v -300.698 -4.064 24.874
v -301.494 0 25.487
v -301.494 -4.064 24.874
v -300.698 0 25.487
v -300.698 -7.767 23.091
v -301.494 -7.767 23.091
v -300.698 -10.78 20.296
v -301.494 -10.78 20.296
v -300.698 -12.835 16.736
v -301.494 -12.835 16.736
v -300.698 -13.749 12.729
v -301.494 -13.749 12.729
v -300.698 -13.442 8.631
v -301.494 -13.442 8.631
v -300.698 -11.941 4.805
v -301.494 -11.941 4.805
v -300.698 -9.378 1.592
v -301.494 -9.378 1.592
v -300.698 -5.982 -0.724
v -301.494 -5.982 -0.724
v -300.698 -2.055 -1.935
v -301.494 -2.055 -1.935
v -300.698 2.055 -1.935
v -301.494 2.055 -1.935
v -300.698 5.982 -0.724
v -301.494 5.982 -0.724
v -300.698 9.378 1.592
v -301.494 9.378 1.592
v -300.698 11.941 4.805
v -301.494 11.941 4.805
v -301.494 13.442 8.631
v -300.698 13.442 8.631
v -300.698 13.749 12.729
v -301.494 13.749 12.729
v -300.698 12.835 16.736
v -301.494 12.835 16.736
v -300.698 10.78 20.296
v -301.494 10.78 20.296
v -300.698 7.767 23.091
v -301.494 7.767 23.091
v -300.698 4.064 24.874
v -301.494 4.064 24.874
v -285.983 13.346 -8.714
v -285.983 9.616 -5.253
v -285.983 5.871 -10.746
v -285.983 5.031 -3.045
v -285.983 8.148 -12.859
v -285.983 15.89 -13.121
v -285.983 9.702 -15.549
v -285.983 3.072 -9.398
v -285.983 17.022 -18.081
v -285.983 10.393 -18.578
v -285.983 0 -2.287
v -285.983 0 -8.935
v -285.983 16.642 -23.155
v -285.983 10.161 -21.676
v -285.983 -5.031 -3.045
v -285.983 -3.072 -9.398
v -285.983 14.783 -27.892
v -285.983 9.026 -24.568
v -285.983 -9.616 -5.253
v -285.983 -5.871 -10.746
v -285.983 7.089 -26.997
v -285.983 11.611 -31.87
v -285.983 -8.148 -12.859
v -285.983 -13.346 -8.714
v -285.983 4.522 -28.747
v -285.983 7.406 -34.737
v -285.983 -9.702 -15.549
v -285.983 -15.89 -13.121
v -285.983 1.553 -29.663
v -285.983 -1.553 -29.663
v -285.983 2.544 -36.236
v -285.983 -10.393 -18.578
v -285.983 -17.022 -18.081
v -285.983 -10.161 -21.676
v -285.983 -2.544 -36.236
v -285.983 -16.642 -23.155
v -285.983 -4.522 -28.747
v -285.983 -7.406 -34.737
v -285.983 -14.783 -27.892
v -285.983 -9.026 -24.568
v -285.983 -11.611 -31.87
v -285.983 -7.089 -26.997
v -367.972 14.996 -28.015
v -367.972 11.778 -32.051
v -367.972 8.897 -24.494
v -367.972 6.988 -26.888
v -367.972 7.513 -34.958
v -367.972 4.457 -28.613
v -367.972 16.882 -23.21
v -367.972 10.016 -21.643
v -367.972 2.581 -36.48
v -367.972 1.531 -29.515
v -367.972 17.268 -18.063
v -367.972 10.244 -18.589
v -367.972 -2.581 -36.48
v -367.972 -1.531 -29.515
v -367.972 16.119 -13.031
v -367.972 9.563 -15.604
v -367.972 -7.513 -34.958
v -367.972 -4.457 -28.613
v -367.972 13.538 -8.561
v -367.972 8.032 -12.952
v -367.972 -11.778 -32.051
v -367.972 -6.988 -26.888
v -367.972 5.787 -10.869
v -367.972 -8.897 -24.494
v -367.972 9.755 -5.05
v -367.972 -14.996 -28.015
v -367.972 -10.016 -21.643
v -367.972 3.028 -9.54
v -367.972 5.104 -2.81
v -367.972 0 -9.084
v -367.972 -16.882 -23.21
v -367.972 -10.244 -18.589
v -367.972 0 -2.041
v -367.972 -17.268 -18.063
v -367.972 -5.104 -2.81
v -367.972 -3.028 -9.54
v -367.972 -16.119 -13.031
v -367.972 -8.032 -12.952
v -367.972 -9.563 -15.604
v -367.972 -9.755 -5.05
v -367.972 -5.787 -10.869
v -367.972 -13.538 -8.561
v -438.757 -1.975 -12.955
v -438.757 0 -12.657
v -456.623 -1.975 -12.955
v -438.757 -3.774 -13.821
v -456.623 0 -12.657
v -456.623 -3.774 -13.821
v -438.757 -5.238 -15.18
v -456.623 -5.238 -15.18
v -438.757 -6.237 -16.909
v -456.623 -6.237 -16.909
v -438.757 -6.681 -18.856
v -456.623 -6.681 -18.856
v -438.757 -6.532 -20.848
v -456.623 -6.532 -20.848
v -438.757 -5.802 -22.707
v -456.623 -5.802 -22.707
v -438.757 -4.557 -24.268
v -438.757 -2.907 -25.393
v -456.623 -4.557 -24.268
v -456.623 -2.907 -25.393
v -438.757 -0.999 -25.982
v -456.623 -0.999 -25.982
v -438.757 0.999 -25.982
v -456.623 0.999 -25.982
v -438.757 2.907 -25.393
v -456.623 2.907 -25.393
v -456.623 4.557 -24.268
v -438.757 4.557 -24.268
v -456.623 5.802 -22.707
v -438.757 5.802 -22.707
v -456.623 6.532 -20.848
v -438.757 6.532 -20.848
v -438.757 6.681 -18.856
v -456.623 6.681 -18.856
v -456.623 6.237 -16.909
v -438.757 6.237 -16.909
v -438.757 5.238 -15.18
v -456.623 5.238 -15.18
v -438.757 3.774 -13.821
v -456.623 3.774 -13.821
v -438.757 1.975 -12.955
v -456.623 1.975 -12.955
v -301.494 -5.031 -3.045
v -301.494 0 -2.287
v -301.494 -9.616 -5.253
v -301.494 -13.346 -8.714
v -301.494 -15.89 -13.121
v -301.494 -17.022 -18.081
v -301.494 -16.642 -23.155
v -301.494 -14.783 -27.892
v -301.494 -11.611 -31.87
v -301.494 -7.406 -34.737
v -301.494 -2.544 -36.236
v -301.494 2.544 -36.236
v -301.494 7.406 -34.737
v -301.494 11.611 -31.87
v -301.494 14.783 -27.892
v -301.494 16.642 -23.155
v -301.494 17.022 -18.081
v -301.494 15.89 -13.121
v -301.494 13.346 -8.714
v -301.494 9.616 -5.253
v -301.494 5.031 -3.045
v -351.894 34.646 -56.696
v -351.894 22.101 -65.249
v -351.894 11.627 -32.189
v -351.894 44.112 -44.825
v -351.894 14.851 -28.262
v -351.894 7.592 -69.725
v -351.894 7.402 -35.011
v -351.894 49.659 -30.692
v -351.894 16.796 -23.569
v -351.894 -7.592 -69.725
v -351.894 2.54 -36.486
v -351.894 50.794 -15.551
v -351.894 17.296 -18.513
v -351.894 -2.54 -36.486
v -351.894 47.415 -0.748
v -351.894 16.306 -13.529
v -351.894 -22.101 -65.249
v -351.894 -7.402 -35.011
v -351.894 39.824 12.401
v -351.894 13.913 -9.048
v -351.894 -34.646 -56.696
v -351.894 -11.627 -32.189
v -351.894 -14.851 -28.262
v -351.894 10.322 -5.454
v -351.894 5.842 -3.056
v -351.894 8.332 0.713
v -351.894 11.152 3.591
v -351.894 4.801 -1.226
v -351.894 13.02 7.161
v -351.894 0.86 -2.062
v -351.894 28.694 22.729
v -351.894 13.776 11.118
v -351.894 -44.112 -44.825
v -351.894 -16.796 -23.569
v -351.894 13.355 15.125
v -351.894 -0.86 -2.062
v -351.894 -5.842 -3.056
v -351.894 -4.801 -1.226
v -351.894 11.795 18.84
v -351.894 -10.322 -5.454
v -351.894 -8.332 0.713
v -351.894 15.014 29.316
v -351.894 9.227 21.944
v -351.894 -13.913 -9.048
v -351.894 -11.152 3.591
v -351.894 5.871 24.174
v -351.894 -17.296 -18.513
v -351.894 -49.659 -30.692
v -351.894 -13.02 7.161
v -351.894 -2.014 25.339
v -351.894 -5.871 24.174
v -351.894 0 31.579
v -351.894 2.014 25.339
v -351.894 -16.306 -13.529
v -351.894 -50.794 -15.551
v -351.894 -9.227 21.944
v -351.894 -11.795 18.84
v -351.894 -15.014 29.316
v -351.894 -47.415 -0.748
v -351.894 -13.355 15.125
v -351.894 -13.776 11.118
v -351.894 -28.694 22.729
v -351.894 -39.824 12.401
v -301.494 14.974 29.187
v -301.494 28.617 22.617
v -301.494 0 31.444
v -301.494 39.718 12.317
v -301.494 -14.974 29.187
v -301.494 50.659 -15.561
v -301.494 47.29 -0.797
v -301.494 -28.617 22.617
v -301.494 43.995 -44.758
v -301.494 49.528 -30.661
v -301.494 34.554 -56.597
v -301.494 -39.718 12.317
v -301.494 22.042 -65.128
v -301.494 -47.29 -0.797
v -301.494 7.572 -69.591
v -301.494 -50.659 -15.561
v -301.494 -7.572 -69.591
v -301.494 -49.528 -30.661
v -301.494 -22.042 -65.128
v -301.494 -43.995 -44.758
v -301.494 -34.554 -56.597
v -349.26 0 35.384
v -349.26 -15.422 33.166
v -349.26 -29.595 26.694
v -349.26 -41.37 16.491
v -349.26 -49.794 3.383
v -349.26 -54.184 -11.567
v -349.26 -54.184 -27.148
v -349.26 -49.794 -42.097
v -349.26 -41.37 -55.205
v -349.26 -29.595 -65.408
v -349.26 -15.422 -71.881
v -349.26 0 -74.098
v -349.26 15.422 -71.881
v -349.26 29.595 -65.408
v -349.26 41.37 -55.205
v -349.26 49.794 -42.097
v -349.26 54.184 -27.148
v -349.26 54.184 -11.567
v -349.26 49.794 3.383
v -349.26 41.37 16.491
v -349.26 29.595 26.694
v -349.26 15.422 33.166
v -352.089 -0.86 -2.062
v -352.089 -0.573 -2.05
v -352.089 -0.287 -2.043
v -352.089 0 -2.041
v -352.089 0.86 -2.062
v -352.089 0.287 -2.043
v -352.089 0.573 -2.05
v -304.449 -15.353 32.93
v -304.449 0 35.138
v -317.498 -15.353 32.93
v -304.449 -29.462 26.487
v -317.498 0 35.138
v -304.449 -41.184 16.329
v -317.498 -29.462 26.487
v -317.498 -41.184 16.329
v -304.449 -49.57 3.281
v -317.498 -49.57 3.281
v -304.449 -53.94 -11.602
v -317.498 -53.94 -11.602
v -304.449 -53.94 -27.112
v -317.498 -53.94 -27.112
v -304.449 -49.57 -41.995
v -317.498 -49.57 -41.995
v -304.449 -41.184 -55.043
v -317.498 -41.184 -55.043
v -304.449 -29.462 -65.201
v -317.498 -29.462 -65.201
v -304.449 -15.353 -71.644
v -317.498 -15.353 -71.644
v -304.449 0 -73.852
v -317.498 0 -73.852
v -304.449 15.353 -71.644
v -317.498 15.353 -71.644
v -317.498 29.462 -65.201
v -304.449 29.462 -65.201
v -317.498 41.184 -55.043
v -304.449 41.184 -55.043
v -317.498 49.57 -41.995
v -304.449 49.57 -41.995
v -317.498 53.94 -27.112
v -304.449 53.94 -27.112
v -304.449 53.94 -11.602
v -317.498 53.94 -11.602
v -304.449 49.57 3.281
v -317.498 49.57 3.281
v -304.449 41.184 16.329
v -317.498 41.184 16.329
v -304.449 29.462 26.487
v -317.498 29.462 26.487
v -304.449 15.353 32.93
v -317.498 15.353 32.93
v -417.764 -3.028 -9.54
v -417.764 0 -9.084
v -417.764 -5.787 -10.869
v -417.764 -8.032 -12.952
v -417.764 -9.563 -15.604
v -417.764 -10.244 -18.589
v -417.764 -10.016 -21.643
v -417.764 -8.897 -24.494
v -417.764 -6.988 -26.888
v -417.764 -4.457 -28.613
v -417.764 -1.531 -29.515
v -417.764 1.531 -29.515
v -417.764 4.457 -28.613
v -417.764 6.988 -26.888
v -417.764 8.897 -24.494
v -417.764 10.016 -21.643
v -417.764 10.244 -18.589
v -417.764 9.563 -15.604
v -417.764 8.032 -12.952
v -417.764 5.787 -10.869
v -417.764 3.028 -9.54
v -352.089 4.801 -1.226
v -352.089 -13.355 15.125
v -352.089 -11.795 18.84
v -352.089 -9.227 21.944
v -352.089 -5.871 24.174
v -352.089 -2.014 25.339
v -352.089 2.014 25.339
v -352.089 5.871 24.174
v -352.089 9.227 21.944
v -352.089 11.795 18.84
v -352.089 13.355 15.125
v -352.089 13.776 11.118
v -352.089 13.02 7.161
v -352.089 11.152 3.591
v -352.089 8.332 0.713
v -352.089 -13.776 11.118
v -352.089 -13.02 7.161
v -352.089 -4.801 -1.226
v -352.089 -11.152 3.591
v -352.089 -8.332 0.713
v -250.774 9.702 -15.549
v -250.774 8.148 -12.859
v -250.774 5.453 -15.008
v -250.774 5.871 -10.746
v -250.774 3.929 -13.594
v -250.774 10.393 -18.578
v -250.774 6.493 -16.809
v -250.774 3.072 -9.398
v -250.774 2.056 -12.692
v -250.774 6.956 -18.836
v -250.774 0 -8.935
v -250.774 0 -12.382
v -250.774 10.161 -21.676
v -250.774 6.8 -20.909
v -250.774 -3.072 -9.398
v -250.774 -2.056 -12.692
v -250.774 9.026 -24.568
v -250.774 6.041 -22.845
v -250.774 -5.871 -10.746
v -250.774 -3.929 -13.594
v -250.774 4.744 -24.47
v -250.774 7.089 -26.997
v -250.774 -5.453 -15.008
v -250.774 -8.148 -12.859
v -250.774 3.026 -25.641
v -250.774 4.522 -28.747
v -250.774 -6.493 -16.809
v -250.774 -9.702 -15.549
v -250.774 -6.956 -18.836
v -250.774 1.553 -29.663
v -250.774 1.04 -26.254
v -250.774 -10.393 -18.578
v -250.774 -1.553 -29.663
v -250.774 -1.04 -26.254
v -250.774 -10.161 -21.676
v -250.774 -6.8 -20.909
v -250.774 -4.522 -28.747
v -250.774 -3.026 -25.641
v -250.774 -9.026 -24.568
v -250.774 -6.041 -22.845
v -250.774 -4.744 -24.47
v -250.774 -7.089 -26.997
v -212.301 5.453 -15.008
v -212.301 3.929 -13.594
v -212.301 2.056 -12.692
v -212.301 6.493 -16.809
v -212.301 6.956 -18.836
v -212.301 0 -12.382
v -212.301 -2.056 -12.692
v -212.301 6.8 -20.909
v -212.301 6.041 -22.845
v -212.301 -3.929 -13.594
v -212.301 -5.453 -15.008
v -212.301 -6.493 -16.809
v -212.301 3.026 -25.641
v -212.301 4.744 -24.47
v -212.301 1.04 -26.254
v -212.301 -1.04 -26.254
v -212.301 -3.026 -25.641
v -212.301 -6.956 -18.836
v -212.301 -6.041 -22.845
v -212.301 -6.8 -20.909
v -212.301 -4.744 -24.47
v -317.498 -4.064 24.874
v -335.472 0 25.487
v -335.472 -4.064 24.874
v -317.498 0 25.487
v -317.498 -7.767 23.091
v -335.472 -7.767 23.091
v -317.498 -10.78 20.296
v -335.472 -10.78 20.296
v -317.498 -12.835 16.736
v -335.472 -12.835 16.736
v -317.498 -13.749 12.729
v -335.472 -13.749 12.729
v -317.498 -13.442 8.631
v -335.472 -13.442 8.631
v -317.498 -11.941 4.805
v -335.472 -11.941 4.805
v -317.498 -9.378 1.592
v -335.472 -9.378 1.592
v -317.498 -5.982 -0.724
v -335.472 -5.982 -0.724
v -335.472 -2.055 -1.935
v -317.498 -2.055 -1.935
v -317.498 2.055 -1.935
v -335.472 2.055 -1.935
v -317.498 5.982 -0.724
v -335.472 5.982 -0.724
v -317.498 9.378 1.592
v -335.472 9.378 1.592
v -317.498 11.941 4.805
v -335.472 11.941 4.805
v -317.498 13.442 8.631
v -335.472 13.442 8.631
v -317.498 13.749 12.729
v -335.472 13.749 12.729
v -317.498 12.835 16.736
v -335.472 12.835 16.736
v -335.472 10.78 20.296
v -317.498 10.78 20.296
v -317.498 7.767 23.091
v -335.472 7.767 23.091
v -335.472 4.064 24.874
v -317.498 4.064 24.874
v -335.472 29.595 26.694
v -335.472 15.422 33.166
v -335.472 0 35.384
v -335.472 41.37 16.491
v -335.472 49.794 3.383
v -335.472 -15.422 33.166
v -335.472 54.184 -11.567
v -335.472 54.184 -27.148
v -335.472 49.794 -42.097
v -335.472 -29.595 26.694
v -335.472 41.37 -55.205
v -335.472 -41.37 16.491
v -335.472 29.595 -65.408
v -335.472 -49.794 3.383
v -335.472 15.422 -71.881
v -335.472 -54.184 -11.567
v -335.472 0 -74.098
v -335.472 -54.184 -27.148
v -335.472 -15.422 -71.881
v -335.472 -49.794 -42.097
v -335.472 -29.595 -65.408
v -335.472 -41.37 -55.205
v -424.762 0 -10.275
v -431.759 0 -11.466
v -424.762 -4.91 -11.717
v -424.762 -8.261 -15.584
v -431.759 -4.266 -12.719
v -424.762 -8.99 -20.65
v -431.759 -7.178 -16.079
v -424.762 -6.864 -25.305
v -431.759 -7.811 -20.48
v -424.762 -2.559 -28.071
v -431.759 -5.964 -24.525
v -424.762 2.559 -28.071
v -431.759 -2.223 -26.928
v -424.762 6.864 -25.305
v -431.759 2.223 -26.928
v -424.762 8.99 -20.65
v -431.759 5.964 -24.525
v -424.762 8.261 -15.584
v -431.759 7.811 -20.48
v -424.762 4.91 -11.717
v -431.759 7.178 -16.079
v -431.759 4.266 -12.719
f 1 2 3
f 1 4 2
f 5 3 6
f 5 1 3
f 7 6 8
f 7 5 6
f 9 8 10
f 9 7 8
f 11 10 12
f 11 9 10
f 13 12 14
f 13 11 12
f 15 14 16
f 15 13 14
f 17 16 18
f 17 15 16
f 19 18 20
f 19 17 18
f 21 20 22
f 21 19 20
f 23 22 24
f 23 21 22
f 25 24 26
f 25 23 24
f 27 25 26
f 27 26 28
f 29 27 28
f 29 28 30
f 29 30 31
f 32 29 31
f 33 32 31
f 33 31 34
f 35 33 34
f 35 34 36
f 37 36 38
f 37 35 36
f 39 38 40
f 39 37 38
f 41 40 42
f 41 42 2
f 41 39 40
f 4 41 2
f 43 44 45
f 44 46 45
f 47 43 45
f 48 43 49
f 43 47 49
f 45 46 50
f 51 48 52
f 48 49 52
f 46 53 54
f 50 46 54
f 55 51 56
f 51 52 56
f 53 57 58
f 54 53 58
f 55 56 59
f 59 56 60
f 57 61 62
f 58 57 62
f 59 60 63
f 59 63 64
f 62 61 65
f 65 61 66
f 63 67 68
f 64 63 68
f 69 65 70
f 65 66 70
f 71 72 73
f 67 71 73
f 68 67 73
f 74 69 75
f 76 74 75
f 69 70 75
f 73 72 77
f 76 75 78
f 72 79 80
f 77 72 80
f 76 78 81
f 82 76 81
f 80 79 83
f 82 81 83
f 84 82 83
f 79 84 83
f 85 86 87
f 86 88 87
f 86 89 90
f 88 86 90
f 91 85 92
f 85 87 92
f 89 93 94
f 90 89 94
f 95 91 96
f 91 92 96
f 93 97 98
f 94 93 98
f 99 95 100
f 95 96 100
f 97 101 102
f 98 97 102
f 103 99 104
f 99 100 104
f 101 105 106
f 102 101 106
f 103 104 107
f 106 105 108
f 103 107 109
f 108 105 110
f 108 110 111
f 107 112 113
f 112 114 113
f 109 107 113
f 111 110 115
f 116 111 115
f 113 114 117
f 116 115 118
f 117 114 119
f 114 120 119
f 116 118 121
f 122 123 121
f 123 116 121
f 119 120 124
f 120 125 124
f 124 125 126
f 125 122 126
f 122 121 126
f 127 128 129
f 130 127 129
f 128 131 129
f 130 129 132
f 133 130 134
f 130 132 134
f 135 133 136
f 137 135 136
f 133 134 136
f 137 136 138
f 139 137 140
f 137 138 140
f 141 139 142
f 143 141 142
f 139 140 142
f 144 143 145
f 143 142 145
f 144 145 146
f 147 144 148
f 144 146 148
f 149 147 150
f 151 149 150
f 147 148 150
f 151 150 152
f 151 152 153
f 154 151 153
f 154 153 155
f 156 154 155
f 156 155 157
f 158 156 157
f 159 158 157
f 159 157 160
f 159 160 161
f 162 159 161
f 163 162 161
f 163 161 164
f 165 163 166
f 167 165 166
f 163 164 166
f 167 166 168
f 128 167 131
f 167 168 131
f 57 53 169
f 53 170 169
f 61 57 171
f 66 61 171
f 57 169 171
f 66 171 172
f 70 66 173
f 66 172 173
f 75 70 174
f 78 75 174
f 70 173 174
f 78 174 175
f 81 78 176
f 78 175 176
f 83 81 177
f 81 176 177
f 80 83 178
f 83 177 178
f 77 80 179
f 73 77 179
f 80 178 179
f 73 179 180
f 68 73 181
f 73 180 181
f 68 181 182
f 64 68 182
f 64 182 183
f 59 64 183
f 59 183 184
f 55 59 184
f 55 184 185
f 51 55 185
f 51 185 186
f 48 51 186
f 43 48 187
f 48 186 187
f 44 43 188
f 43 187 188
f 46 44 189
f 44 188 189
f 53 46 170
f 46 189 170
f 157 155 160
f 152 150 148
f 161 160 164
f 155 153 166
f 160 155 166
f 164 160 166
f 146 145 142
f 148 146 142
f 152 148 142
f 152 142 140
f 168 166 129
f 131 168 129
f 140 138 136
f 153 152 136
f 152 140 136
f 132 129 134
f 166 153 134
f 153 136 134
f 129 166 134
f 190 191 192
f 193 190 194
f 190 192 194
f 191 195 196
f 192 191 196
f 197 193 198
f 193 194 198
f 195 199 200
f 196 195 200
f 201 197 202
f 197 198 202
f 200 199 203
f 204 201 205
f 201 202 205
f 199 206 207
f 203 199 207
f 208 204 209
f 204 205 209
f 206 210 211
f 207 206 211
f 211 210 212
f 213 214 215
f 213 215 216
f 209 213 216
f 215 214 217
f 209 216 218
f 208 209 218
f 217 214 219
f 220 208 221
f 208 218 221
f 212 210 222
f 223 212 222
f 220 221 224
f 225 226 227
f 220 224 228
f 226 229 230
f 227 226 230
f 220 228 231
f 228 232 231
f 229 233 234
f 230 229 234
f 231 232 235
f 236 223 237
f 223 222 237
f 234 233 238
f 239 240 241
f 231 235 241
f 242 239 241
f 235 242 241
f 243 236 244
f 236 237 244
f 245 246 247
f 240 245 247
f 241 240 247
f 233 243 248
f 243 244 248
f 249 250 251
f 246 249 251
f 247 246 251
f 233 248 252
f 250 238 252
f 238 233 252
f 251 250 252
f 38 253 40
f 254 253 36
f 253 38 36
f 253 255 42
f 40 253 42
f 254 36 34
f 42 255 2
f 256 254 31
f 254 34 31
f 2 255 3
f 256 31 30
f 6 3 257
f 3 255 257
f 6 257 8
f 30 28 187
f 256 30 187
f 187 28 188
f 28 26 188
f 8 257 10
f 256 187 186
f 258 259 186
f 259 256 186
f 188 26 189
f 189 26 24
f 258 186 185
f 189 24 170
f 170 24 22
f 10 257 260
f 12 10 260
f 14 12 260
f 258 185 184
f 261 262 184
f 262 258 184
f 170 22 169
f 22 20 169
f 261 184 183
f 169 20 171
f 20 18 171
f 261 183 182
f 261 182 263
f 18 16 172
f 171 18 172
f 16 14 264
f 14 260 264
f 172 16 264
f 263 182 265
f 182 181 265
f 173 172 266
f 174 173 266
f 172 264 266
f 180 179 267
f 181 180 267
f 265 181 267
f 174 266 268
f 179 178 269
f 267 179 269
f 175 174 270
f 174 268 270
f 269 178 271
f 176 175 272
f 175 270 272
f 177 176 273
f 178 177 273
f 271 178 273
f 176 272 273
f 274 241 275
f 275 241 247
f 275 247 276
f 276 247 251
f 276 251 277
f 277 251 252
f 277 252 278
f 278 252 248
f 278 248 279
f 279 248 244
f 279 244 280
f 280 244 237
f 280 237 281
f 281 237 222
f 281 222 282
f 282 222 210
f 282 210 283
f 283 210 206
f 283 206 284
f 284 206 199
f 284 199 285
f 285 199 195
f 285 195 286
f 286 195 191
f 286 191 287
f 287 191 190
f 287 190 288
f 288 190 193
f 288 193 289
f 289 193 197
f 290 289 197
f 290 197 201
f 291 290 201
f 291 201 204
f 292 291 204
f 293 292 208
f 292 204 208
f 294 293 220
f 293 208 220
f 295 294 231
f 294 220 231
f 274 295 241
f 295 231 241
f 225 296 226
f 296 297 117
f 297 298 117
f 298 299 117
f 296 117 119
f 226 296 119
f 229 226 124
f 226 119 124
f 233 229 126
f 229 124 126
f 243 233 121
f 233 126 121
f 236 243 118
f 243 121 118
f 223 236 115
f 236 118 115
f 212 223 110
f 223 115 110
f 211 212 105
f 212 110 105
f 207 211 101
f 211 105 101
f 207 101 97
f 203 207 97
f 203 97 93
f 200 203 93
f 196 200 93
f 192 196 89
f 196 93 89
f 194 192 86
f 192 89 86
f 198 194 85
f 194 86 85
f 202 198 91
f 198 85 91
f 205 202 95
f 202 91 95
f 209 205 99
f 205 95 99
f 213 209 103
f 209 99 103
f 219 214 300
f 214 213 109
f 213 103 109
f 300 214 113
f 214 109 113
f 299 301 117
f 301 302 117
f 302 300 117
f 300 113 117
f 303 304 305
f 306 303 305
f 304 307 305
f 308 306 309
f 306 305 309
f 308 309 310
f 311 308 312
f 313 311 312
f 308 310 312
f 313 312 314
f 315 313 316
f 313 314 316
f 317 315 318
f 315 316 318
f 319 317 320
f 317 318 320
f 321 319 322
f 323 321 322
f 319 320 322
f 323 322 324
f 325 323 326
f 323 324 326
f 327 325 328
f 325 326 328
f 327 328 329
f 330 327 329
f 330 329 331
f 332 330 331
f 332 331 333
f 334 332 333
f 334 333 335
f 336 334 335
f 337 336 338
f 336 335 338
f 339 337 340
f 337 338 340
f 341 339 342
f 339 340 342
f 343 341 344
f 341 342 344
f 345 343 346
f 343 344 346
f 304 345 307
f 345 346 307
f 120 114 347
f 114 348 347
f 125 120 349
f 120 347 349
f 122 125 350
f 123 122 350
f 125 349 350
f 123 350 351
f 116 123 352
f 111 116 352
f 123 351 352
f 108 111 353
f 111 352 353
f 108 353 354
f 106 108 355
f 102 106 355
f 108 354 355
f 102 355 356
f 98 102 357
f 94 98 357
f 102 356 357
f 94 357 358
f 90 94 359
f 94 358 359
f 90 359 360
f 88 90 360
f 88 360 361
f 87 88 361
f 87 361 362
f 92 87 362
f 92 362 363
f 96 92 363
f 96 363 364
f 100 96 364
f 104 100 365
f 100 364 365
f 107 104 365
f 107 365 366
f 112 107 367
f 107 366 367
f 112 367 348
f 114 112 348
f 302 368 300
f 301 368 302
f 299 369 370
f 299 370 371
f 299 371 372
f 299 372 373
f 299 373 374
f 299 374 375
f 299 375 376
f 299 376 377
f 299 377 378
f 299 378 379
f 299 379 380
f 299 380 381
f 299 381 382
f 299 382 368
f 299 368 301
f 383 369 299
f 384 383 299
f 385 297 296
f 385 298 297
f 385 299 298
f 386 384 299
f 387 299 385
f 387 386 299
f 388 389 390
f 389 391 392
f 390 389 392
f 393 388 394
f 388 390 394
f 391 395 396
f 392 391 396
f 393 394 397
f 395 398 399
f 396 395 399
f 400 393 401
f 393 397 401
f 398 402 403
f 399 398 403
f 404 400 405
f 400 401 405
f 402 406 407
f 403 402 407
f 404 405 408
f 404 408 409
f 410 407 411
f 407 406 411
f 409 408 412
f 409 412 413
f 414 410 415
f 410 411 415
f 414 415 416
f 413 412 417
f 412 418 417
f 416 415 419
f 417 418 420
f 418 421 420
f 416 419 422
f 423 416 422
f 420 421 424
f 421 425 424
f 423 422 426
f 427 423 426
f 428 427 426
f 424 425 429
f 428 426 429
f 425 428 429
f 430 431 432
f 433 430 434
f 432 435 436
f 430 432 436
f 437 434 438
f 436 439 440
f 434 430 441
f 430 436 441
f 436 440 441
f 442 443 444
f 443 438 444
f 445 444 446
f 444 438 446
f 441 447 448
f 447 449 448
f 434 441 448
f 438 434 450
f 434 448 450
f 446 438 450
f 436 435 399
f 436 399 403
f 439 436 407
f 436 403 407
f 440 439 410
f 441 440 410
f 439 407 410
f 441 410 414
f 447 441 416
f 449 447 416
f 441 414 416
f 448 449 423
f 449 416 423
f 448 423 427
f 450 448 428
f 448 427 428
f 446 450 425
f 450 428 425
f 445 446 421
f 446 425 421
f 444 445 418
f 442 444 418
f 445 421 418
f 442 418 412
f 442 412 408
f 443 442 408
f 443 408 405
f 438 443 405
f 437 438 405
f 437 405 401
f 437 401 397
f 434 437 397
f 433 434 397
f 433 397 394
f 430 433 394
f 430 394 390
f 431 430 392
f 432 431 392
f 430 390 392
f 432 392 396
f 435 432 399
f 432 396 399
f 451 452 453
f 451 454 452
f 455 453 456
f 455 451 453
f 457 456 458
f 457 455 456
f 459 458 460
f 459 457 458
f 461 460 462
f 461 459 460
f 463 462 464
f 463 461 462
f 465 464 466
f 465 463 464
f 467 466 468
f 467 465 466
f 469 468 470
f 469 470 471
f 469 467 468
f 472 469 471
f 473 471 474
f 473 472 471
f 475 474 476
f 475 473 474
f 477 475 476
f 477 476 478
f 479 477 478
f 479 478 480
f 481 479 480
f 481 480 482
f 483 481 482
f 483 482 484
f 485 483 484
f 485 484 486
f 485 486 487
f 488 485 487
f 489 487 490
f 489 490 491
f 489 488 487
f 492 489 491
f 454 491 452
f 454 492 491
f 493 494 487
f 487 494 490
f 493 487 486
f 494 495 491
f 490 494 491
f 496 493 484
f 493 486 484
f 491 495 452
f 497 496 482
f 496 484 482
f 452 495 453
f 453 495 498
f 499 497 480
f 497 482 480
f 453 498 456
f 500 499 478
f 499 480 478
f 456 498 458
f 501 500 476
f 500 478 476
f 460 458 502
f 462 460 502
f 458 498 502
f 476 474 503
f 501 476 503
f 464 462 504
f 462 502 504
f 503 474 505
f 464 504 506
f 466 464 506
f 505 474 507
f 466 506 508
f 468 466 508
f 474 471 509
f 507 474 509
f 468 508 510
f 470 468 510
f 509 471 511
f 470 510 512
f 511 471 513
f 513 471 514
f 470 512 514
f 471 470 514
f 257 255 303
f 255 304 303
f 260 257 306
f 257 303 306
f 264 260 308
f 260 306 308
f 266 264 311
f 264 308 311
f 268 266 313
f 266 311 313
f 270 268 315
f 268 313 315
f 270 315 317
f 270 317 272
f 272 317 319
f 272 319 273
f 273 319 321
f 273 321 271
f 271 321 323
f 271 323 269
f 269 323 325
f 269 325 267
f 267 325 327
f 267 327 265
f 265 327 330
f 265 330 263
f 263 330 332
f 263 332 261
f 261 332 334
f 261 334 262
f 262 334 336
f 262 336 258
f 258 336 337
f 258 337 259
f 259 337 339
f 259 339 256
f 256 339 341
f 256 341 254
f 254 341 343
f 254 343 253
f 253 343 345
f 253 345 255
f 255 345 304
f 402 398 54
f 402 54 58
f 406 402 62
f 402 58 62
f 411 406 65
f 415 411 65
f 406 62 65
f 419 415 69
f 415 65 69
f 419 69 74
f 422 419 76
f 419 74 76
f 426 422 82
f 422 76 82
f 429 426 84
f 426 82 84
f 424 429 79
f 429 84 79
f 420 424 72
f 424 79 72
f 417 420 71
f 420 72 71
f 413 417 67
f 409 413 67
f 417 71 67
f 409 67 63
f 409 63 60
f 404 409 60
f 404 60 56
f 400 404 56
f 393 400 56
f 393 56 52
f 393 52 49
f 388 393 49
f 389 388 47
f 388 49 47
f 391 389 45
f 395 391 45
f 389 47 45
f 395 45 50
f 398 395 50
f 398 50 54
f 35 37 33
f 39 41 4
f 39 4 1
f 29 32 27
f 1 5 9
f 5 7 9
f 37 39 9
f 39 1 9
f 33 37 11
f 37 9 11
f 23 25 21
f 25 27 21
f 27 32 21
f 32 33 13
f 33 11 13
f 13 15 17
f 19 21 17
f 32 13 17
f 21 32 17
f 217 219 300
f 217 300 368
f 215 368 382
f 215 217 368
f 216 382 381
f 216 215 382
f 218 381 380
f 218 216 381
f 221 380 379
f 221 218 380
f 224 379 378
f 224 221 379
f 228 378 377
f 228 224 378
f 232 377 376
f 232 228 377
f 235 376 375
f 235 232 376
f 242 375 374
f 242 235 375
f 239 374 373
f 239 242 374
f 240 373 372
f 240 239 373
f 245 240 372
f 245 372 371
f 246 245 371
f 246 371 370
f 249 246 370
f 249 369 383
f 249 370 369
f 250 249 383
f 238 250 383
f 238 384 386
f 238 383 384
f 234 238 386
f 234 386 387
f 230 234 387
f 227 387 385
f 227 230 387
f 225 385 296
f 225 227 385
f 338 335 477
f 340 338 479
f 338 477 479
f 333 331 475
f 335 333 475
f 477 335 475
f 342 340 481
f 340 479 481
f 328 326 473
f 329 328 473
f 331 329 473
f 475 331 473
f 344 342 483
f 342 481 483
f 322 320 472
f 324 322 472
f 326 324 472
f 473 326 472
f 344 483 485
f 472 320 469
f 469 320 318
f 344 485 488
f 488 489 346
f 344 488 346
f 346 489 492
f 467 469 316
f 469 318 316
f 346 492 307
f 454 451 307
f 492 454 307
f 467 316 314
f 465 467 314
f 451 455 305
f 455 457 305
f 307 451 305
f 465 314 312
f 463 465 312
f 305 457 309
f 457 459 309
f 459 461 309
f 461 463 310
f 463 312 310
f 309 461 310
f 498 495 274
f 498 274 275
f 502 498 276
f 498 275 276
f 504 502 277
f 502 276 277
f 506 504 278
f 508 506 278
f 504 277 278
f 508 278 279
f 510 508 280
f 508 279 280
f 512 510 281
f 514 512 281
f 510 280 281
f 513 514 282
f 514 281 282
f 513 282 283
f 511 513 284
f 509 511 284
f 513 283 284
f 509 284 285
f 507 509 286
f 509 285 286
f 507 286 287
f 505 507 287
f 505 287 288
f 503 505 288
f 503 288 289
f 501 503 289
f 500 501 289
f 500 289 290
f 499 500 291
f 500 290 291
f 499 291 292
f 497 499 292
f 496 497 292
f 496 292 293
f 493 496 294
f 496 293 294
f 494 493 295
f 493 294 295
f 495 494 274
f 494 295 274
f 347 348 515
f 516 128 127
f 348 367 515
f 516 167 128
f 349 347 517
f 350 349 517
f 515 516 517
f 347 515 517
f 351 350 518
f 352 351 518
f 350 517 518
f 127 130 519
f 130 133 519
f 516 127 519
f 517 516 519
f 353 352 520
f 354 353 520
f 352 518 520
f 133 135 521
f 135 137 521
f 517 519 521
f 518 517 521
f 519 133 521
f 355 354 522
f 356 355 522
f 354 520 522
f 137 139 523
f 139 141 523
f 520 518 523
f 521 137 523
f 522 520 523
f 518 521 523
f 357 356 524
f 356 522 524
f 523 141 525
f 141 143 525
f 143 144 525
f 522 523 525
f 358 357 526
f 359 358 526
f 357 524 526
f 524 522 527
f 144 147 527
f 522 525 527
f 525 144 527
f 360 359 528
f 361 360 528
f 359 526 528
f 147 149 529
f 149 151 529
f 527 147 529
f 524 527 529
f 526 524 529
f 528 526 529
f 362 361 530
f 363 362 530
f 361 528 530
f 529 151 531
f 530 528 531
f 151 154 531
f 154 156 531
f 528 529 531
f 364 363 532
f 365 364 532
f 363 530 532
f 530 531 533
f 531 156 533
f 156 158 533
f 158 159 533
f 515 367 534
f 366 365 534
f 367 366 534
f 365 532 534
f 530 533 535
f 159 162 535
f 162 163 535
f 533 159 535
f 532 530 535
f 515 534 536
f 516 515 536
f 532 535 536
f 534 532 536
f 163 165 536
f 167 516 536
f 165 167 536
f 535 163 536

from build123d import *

# Parameters (mm, degrees)
F3_W = 51.3915717602
F3_H = 13.7879867107


with BuildPart() as f1:
    # F0 (on Front) → F1 (revolve)
    with BuildSketch(Plane.XZ):
        Polygon((-456.6233754158, -12.6571897417), (-456.6233754158, -19.3570647389), (-335.4718983173, -19.3570647389), (-335.4718983173, 35.3837870061), (-349.2599129677, 35.3837870061), (-351.8936932087, 31.5794658113), (-351.8936932087, 25.0690672547), (-351.8936932087, 11.698897928), (-351.8936932087, -2.0408849232), (-367.9722547531, -2.0408849232), (-367.9722547531, -9.0839220211), (-417.7640676498, -9.0839220211), (-438.757032156, -12.6571897417), align=None)
    revolve(axis=Axis((-396.0476368666, 0, -19.3570647389), (1, 0, 0)))



with BuildPart() as f2:
    # F0 (on Front) → F2 (revolve)
    with BuildSketch(Plane.XZ):
        Polygon((-317.4982070923, -19.3570647389), (-212.301209569, -19.3570647389), (-212.301209569, -12.3819122091), (-250.7739365101, -12.3819122091), (-250.7739365101, -8.9349010959), (-285.9826683998, -8.9349010959), (-285.9826683998, -2.2870996036), (-301.4942109585, -2.2870996036), (-301.4942109585, 11.698897928), (-301.4942109585, 25.0690672547), (-301.4942109585, 31.4443483949), (-304.4488132, 35.1375713944), (-317.4982070923, 35.1375713944), align=None)
    revolve(axis=Axis((-264.8997083306, 0, -19.3570647389), (1, 0, 0)))


with BuildPart() as f1_1:
    add(f1.part)

    add(f2.part)  # F4 merges F2
    # F3 (on Front) → F4 (revolve)
    with BuildSketch(Plane.XZ):
        with Locations((-326.3935595751, 18.5928912833)):
            Rectangle(F3_W, F3_H)
    revolve(axis=Axis((-326.3935595751, 0, 11.698897928), (1, 0, 0)))


solid = f1_1.part
